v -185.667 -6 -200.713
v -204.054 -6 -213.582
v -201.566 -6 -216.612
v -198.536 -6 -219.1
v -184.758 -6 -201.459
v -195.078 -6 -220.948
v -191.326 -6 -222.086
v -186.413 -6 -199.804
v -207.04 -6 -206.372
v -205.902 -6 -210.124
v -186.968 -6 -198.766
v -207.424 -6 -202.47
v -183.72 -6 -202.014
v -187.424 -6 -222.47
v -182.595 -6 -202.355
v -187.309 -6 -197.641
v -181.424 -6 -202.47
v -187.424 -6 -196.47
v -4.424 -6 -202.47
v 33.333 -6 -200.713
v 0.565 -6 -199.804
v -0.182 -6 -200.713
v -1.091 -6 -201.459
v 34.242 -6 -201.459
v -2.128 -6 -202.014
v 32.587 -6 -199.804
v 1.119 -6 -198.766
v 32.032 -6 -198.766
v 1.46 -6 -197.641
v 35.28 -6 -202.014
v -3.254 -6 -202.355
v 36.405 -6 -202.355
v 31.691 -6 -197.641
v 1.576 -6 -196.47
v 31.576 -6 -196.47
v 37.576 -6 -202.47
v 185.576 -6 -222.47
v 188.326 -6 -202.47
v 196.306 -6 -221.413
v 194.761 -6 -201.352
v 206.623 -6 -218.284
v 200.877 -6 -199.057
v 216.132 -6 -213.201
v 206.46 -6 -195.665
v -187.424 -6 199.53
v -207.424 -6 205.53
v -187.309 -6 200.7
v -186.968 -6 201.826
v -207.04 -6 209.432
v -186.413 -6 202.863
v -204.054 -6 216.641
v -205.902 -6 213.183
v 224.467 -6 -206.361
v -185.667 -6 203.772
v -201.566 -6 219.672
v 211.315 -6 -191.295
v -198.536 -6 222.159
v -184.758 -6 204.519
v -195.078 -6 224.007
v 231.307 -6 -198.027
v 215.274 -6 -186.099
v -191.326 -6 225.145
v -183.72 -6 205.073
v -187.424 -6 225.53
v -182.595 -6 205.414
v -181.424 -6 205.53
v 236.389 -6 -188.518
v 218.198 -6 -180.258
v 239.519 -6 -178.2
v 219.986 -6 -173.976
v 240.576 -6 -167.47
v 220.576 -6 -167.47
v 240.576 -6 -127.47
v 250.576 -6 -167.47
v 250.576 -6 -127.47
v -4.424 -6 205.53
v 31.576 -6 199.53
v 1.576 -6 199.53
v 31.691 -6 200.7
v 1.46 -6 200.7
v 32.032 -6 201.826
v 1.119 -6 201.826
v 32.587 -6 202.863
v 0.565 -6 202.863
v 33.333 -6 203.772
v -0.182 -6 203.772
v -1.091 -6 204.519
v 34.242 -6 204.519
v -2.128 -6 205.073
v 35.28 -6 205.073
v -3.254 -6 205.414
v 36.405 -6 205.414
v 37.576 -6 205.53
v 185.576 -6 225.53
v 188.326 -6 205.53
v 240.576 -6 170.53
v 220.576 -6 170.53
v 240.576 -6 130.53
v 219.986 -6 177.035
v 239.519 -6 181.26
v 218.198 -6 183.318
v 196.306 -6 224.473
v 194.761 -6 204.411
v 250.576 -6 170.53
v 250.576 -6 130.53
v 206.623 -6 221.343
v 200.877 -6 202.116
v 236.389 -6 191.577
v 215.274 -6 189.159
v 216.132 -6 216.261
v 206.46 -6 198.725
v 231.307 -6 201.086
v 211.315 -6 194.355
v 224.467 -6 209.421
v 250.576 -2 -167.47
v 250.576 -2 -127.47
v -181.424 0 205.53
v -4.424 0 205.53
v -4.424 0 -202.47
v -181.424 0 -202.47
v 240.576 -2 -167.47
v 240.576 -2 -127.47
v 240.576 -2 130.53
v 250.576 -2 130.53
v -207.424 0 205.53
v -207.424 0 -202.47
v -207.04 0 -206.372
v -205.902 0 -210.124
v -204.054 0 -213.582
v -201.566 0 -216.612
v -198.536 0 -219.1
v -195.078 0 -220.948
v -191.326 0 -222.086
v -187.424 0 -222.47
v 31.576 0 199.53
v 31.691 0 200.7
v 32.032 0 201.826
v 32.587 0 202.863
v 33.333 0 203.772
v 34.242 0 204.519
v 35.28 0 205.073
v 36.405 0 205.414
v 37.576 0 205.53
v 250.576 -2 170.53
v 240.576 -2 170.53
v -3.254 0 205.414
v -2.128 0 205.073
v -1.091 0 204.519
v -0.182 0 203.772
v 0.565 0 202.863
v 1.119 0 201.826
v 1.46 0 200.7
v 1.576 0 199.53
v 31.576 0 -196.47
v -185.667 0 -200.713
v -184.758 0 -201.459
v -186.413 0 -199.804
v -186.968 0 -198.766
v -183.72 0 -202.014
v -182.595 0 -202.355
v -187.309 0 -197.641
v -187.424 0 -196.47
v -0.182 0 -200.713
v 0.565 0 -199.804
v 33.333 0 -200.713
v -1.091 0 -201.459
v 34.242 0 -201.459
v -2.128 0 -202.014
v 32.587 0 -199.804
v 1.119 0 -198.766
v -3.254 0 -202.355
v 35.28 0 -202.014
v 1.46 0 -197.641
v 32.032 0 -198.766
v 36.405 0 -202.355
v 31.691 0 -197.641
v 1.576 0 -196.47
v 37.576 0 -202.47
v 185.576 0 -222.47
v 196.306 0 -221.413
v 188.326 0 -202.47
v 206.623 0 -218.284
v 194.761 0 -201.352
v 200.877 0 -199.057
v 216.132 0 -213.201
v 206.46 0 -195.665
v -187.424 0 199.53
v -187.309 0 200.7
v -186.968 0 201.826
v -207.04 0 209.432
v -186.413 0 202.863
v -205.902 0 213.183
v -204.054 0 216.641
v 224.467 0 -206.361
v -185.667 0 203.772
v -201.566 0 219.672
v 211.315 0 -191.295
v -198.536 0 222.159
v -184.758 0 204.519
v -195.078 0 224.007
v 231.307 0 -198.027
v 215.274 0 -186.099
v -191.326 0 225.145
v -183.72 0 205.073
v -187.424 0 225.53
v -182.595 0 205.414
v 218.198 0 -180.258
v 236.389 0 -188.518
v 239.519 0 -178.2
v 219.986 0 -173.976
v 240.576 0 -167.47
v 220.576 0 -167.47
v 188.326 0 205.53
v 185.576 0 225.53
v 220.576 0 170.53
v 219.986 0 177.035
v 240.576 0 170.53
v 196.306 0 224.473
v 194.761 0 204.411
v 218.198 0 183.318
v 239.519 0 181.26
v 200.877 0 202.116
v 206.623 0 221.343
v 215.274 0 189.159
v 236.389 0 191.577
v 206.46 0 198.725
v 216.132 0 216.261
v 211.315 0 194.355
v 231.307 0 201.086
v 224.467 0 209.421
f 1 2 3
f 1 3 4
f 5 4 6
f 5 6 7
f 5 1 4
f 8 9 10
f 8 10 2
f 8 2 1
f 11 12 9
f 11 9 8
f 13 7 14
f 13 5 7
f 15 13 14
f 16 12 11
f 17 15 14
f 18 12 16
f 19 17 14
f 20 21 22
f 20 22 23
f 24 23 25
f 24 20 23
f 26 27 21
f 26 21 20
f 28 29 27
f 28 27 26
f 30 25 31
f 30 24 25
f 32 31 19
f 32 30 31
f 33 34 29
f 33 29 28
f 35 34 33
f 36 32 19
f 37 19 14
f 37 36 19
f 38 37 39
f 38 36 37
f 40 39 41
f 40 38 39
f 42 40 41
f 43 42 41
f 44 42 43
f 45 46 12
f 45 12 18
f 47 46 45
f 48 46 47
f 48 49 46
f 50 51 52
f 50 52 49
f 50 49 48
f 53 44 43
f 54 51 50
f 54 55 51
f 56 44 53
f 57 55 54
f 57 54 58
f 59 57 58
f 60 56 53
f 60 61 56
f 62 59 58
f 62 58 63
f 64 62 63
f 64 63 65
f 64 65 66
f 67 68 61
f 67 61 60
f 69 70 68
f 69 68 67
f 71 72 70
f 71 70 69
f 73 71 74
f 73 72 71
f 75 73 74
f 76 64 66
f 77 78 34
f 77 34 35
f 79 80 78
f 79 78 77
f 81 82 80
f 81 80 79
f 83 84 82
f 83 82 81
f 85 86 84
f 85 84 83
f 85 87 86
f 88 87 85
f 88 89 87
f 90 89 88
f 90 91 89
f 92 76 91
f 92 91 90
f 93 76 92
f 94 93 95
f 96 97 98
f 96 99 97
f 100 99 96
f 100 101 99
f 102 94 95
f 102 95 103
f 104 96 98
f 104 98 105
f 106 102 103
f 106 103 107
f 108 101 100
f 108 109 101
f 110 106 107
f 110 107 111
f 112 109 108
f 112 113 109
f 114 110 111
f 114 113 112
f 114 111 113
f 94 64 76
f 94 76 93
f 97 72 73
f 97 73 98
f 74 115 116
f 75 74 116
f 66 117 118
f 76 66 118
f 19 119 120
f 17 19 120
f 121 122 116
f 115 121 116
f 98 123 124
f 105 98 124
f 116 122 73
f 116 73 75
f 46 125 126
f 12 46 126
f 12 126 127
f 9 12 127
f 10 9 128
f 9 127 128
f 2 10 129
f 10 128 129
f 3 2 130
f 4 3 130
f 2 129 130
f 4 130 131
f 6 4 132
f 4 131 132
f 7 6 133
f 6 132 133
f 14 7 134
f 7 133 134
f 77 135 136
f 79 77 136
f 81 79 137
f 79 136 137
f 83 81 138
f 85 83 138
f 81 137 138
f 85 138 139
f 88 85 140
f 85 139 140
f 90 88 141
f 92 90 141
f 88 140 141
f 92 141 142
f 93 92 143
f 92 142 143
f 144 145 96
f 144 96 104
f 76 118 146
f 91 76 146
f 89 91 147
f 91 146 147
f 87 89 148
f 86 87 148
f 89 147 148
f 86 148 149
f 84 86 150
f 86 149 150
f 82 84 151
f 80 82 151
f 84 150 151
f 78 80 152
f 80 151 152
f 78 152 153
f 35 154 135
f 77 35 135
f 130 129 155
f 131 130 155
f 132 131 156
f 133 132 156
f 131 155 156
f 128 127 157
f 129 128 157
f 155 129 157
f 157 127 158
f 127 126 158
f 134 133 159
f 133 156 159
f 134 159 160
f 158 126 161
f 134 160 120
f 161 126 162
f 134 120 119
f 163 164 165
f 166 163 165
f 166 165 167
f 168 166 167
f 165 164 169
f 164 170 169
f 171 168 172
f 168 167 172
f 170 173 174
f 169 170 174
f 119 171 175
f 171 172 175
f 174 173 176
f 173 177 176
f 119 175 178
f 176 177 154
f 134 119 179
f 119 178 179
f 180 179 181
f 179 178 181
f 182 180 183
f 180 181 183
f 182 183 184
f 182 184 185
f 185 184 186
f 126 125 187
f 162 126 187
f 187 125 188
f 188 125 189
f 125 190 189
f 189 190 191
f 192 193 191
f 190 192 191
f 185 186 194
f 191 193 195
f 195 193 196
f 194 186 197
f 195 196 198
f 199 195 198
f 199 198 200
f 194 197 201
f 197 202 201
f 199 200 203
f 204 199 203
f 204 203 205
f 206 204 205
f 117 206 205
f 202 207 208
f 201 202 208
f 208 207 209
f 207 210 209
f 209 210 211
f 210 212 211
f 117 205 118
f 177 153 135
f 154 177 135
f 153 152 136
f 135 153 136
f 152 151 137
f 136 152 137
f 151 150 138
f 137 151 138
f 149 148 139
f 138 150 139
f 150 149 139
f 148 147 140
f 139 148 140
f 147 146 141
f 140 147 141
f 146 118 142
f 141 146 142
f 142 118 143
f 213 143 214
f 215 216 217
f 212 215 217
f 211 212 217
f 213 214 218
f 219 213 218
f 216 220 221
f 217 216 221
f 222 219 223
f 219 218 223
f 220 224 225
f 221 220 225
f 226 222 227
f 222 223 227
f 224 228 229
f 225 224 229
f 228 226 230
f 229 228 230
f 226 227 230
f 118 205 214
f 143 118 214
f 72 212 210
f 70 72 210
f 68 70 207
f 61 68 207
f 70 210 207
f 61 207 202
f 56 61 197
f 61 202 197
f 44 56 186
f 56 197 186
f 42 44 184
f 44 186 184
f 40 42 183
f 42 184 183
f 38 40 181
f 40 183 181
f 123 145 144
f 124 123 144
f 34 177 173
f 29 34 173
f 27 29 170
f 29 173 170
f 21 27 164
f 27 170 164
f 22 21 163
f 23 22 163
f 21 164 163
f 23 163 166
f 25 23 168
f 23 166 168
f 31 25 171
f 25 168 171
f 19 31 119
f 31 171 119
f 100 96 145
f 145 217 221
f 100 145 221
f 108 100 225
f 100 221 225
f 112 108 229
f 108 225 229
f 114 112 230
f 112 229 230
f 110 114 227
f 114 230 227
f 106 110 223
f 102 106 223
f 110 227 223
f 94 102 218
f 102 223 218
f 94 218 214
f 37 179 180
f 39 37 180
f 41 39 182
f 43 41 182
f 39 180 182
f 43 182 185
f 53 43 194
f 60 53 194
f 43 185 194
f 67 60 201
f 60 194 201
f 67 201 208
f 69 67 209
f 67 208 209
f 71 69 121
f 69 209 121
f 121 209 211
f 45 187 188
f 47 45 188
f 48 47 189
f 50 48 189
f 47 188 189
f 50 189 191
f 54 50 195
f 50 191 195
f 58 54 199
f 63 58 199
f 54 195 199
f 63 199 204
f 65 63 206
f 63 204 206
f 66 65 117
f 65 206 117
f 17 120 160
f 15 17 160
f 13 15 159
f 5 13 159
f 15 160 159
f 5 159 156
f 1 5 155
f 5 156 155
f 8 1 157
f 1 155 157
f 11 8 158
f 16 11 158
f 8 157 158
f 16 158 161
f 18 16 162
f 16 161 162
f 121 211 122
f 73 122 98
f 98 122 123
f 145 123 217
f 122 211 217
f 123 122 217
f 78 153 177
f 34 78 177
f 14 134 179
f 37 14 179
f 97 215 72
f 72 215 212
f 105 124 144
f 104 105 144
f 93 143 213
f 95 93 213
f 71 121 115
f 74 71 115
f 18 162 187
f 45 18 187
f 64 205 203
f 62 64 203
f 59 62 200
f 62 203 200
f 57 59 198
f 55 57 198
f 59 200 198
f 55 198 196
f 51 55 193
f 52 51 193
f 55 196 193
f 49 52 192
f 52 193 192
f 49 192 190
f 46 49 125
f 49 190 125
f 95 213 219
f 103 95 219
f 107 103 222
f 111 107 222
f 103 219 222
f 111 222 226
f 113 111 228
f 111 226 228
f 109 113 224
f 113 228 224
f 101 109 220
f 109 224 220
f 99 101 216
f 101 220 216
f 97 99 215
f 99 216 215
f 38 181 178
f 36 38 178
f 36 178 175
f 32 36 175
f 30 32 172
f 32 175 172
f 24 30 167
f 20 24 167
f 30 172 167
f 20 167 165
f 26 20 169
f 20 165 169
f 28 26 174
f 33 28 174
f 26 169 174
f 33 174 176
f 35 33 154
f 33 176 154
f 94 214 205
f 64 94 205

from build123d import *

# Parameters (mm, degrees)
F0_W     = 10
F0_H     = 40
F0_W_2   = 6
F0_W_3   = 14
F0_H_2   = 258
F1_DEPTH = 6
F2_DEPTH = 2


with BuildPart() as f1:
    # F0 (on Front) → F1 (new body)
    with BuildSketch(Plane.XZ):
        with BuildLine():
            Line((185.575712414, 225.5297148285), (-187.424287586, 225.5297148285))
            ThreePointArc((-187.424287586, 225.5297148285), (-201.5664232098, 219.6718504522), (-207.424287586, 205.5297148285))
            Line((-207.424287586, 205.5297148285), (-207.424287586, -202.4702851715))
            ThreePointArc((-207.424287586, -202.4702851715), (-201.5664232098, -216.6124207953), (-187.424287586, -222.4702851715))
            Line((-187.424287586, -222.4702851715), (185.575712414, -222.4702851715))
            ThreePointArc((185.575712414, -222.4702851715), (224.4665853792, -206.3611581368), (240.575712414, -167.4702851715))
            Line((240.575712414, -167.4702851715), (234.575712414, -167.4702851715))
            ThreePointArc((234.575712414, -167.4702851715), (220.2239446921, -202.1185174497), (185.575712414, -216.4702851715))
            Line((185.575712414, -216.4702851715), (-187.424287586, -216.4702851715))
            ThreePointArc((-187.424287586, -216.4702851715), (-197.3237825226, -212.3697801081), (-201.424287586, -202.4702851715))
            Line((-201.424287586, -202.4702851715), (-201.424287586, 205.5297148285))
            ThreePointArc((-201.424287586, 205.5297148285), (-197.3237825226, 215.4292097651), (-187.424287586, 219.5297148285))
            Line((-187.424287586, 219.5297148285), (185.575712414, 219.5297148285))
            ThreePointArc((185.575712414, 219.5297148285), (220.2239446921, 205.1779471066), (234.575712414, 170.5297148285))
            Line((234.575712414, 170.5297148285), (240.575712414, 170.5297148285))
            ThreePointArc((240.575712414, 170.5297148285), (224.4665853792, 209.4205877937), (185.575712414, 225.5297148285))
        make_face()
        with BuildLine():
            Line((220.575712414, 170.5297148285), (234.575712414, 170.5297148285))
            ThreePointArc((234.575712414, 170.5297148285), (220.2239446921, 205.1779471066), (185.575712414, 219.5297148285))
            Line((185.575712414, 219.5297148285), (-187.424287586, 219.5297148285))
            ThreePointArc((-187.424287586, 219.5297148285), (-197.3237825226, 215.4292097651), (-201.424287586, 205.5297148285))
            Line((-201.424287586, 205.5297148285), (-201.424287586, -202.4702851715))
            ThreePointArc((-201.424287586, -202.4702851715), (-197.3237825226, -212.3697801081), (-187.424287586, -216.4702851715))
            Line((-187.424287586, -216.4702851715), (185.575712414, -216.4702851715))
            ThreePointArc((185.575712414, -216.4702851715), (220.2239446921, -202.1185174497), (234.575712414, -167.4702851715))
            Line((234.575712414, -167.4702851715), (220.575712414, -167.4702851715))
            ThreePointArc((220.575712414, -167.4702851715), (211.315135886, -191.295361085), (188.325712414, -202.4702851715))
            Line((188.325712414, -202.4702851715), (37.575712414, -202.4702851715))
            ThreePointArc((37.575712414, -202.4702851715), (33.3330717268, -200.7129258587), (31.575712414, -196.4702851715))
            Line((31.575712414, -196.4702851715), (31.575712414, 199.5297148285))
            ThreePointArc((31.575712414, 199.5297148285), (33.3330717268, 203.7723555156), (37.575712414, 205.5297148285))
            Line((37.575712414, 205.5297148285), (188.325712414, 205.5297148285))
            ThreePointArc((188.325712414, 205.5297148285), (211.315135886, 194.354790742), (220.575712414, 170.5297148285))
        make_face()
        with BuildLine():
            Line((-187.424287586, -196.4702851715), (-187.424287586, 199.5297148285))
            ThreePointArc((-187.424287586, 199.5297148285), (-185.6669282732, 203.7723555156), (-181.424287586, 205.5297148285))
            Line((-181.424287586, 205.5297148285), (-4.424287586, 205.5297148285))
            ThreePointArc((-4.424287586, 205.5297148285), (-0.1816468989, 203.7723555156), (1.575712414, 199.5297148285))
            Line((1.575712414, 199.5297148285), (1.575712414, -196.4702851715))
            ThreePointArc((1.575712414, -196.4702851715), (-0.1816468989, -200.7129258587), (-4.424287586, -202.4702851715))
            Line((-4.424287586, -202.4702851715), (-181.424287586, -202.4702851715))
            ThreePointArc((-181.424287586, -202.4702851715), (-185.6669282732, -200.7129258587), (-187.424287586, -196.4702851715))
        make_face(mode=Mode.SUBTRACT)
        with Locations((245.575712414, 150.5297148285)):
            Rectangle(F0_W, F0_H)
        with Locations((237.575712414, 150.5297148285)):
            Rectangle(F0_W_2, F0_H)
        with Locations((227.575712414, 150.5297148285)):
            Rectangle(F0_W_3, F0_H)
        with Locations((227.575712414, 1.5297148285)):
            Rectangle(F0_W_3, F0_H_2)
        with Locations((237.575712414, 1.5297148285)):
            Rectangle(F0_W_2, F0_H_2)
        with Locations((237.575712414, -147.4702851715)):
            Rectangle(F0_W_2, F0_H)
        with Locations((227.575712414, -147.4702851715)):
            Rectangle(F0_W_3, F0_H)
        with Locations((245.575712414, -147.4702851715)):
            Rectangle(F0_W, F0_H)
    extrude(amount=F1_DEPTH)

    # F0 (on Front) → F2 (cut)
    with BuildSketch(Plane.XZ):
        with Locations((245.575712414, 150.5297148285)):
            Rectangle(F0_W, F0_H)
        with Locations((245.575712414, -147.4702851715)):
            Rectangle(F0_W, F0_H)
    extrude(amount=F2_DEPTH, mode=Mode.SUBTRACT)


solid = f1.part
